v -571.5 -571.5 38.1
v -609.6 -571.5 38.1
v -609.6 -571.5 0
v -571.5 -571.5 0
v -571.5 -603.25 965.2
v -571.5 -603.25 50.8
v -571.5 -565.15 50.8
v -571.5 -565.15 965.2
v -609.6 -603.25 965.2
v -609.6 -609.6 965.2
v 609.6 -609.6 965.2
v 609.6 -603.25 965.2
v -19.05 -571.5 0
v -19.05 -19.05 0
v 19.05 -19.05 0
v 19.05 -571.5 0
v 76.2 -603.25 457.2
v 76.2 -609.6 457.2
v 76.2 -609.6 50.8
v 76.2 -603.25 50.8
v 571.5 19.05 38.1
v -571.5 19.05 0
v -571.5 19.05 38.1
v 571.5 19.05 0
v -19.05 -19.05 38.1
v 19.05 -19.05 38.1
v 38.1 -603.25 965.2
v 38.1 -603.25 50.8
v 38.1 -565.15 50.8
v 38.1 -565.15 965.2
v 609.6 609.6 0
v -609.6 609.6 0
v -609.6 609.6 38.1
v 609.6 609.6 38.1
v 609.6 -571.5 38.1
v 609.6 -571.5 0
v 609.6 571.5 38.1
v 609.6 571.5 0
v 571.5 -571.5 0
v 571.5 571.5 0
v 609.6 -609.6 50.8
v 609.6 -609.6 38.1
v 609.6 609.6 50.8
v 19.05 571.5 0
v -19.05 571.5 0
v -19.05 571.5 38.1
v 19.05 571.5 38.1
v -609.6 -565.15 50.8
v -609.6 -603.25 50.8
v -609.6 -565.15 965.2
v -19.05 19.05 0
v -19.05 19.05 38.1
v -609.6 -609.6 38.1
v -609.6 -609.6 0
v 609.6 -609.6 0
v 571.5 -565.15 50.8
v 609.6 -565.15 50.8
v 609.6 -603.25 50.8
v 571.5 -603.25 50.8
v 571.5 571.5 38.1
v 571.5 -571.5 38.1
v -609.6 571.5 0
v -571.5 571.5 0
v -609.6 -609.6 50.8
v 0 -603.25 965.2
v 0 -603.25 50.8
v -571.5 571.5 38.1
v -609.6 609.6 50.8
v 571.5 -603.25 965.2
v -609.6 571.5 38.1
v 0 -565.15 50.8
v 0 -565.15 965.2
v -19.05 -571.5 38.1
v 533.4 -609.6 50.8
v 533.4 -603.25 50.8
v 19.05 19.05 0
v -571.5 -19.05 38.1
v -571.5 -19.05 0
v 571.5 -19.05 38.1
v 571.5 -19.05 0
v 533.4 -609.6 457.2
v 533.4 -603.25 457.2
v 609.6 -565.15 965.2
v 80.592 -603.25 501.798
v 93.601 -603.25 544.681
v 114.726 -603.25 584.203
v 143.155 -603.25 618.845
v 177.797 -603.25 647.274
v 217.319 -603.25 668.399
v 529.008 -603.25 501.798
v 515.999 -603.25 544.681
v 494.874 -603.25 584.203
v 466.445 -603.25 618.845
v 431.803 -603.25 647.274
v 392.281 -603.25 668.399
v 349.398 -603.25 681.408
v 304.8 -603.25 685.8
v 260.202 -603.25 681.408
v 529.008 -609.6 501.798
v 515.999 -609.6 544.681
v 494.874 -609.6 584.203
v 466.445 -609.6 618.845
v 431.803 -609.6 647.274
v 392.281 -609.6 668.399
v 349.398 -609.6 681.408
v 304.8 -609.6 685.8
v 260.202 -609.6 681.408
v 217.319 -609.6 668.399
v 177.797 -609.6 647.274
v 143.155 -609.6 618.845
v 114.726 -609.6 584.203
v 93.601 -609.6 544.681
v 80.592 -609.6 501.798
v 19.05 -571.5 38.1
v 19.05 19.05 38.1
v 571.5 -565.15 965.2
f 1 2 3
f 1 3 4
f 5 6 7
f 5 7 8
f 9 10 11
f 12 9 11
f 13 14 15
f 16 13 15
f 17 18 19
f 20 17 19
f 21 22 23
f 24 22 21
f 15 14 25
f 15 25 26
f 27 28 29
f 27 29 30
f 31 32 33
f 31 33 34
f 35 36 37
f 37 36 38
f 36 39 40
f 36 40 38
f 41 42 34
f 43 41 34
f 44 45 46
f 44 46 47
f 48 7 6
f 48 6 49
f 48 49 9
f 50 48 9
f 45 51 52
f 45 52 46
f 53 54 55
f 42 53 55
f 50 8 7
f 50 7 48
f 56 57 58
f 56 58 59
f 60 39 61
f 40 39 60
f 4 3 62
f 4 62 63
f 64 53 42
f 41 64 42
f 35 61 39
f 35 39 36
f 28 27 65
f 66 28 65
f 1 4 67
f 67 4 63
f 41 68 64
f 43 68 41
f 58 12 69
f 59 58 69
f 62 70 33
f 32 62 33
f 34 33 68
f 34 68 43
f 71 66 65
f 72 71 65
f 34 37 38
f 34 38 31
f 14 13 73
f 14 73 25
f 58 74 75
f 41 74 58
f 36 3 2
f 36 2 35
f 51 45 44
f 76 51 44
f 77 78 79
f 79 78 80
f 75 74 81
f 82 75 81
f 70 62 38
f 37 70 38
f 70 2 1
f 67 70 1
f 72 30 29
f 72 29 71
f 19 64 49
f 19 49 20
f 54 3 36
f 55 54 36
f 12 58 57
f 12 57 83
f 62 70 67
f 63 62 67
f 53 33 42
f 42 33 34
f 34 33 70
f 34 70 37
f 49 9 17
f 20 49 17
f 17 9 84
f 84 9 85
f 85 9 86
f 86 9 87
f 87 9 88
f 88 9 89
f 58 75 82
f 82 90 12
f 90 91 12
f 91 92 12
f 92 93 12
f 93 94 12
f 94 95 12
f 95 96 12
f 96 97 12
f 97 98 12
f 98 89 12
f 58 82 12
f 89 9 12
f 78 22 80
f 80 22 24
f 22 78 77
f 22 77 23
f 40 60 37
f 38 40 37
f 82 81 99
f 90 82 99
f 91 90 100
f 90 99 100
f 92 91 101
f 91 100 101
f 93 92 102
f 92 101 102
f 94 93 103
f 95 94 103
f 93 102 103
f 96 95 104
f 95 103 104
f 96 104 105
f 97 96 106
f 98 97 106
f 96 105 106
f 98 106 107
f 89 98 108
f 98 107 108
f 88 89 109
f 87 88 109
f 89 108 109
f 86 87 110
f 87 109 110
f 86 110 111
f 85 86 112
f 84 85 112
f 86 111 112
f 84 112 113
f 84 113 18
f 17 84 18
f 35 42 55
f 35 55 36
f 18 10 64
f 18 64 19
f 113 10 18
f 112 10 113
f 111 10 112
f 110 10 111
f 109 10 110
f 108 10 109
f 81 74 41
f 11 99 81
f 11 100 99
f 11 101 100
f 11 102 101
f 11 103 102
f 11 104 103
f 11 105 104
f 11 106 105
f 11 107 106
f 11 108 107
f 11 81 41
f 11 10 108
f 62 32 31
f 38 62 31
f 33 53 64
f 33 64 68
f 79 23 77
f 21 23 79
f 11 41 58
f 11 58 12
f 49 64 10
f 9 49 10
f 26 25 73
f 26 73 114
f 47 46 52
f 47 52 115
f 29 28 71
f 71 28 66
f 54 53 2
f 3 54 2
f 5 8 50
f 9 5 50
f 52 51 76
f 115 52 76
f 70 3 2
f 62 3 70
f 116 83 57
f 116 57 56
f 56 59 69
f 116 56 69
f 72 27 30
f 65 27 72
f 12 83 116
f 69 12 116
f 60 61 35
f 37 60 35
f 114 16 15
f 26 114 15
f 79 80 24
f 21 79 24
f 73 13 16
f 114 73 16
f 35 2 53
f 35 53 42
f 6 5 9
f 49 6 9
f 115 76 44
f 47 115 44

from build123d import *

# Parameters (mm, degrees)
F1_W      = 1219.2
F1_H      = 38.1
F1_W_2    = 1143
F2_DEPTH  = 38.1
F3_W      = 38.1
F3_H      = 1143
F4_DEPTH  = 38.1
F5_W      = 38.1
F5_H      = 552.45
F6_DEPTH  = 38.1
F7_W      = 1219.2
F7_H      = 1219.2
F8_DEPTH  = 12.7
F9_W      = 1219.2
F9_H      = 914.4
F10_DEPTH = 6.35
F12_DEPTH = 254
F13_W     = 38.1
F13_H     = 914.4
F14_DEPTH = 38.1
F15_W     = 38.1
F15_H     = 914.4
F16_DEPTH = 38.1


with BuildPart() as f2:
    # F1 (on Top) → F2 (new body)
    with BuildSketch(Plane.XY):
        with Locations((0, -590.55)):
            Rectangle(F1_W, F1_H)
        with Locations((0, 590.55)):
            Rectangle(F1_W, F1_H)
        Rectangle(F1_W_2, F1_H)
    extrude(amount=F2_DEPTH)


with BuildPart() as f4:
    # F3 (on Top) → F4 (new body)
    with BuildSketch(Plane.XY):
        with Locations((590.55, 0)):
            Rectangle(F3_W, F3_H)
        with Locations((-590.55, 0)):
            Rectangle(F3_W, F3_H)
    extrude(amount=F4_DEPTH)


with BuildPart() as f6:
    # F5 (on Top) → F6 (new body)
    with BuildSketch(Plane.XY):
        with Locations((0, 295.275)):
            Rectangle(F5_W, F5_H)
        with Locations((0, -295.275)):
            Rectangle(F5_W, F5_H)
    extrude(amount=F6_DEPTH)


with BuildPart() as f8:
    # F7 (on face) → F8 (new body)
    with BuildSketch(Plane.XY.offset(38.1)):
        Rectangle(F7_W, F7_H)
    extrude(amount=F8_DEPTH)


with BuildPart() as f10:
    # F9 (on face) → F10 (new body)
    with BuildSketch(Plane.XZ.offset(609.6)):
        with Locations((0, 508)):
            Rectangle(F9_W, F9_H)
    extrude(amount=-F10_DEPTH)

    # F11 (on face) → F12 (cut)
    with BuildSketch(Plane.XZ.offset(609.6)):
        with BuildLine():
            Line((76.2, 457.2), (76.2, 50.8))
            Line((76.2, 50.8), (533.4, 50.8))
            Line((533.4, 50.8), (533.4, 457.2))
            ThreePointArc((533.4, 457.2), (304.8, 685.8), (76.2, 457.2))
        make_face()
    extrude(amount=-F12_DEPTH, mode=Mode.SUBTRACT)


with BuildPart() as f14:
    # F13 (on face) → F14 (new body)
    with BuildSketch(Plane(origin=(0, -603.25, 0), x_dir=(-1, 0, 0), z_dir=(0, 1, 0))):
        with Locations((-590.55, 508)):
            Rectangle(F13_W, F13_H)
        with Locations((590.55, 508)):
            Rectangle(F13_W, F13_H)
    extrude(amount=F14_DEPTH)


with BuildPart() as f16:
    # F15 (on face) → F16 (new body)
    with BuildSketch(Plane(origin=(0, -603.25, 0), x_dir=(-1, 0, 0), z_dir=(0, 1, 0))):
        with Locations((-19.05, 508)):
            Rectangle(F15_W, F15_H)
    extrude(amount=F16_DEPTH)


solid = Compound([f2.part, f4.part, f6.part, f8.part, f10.part, f14.part, f16.part])
